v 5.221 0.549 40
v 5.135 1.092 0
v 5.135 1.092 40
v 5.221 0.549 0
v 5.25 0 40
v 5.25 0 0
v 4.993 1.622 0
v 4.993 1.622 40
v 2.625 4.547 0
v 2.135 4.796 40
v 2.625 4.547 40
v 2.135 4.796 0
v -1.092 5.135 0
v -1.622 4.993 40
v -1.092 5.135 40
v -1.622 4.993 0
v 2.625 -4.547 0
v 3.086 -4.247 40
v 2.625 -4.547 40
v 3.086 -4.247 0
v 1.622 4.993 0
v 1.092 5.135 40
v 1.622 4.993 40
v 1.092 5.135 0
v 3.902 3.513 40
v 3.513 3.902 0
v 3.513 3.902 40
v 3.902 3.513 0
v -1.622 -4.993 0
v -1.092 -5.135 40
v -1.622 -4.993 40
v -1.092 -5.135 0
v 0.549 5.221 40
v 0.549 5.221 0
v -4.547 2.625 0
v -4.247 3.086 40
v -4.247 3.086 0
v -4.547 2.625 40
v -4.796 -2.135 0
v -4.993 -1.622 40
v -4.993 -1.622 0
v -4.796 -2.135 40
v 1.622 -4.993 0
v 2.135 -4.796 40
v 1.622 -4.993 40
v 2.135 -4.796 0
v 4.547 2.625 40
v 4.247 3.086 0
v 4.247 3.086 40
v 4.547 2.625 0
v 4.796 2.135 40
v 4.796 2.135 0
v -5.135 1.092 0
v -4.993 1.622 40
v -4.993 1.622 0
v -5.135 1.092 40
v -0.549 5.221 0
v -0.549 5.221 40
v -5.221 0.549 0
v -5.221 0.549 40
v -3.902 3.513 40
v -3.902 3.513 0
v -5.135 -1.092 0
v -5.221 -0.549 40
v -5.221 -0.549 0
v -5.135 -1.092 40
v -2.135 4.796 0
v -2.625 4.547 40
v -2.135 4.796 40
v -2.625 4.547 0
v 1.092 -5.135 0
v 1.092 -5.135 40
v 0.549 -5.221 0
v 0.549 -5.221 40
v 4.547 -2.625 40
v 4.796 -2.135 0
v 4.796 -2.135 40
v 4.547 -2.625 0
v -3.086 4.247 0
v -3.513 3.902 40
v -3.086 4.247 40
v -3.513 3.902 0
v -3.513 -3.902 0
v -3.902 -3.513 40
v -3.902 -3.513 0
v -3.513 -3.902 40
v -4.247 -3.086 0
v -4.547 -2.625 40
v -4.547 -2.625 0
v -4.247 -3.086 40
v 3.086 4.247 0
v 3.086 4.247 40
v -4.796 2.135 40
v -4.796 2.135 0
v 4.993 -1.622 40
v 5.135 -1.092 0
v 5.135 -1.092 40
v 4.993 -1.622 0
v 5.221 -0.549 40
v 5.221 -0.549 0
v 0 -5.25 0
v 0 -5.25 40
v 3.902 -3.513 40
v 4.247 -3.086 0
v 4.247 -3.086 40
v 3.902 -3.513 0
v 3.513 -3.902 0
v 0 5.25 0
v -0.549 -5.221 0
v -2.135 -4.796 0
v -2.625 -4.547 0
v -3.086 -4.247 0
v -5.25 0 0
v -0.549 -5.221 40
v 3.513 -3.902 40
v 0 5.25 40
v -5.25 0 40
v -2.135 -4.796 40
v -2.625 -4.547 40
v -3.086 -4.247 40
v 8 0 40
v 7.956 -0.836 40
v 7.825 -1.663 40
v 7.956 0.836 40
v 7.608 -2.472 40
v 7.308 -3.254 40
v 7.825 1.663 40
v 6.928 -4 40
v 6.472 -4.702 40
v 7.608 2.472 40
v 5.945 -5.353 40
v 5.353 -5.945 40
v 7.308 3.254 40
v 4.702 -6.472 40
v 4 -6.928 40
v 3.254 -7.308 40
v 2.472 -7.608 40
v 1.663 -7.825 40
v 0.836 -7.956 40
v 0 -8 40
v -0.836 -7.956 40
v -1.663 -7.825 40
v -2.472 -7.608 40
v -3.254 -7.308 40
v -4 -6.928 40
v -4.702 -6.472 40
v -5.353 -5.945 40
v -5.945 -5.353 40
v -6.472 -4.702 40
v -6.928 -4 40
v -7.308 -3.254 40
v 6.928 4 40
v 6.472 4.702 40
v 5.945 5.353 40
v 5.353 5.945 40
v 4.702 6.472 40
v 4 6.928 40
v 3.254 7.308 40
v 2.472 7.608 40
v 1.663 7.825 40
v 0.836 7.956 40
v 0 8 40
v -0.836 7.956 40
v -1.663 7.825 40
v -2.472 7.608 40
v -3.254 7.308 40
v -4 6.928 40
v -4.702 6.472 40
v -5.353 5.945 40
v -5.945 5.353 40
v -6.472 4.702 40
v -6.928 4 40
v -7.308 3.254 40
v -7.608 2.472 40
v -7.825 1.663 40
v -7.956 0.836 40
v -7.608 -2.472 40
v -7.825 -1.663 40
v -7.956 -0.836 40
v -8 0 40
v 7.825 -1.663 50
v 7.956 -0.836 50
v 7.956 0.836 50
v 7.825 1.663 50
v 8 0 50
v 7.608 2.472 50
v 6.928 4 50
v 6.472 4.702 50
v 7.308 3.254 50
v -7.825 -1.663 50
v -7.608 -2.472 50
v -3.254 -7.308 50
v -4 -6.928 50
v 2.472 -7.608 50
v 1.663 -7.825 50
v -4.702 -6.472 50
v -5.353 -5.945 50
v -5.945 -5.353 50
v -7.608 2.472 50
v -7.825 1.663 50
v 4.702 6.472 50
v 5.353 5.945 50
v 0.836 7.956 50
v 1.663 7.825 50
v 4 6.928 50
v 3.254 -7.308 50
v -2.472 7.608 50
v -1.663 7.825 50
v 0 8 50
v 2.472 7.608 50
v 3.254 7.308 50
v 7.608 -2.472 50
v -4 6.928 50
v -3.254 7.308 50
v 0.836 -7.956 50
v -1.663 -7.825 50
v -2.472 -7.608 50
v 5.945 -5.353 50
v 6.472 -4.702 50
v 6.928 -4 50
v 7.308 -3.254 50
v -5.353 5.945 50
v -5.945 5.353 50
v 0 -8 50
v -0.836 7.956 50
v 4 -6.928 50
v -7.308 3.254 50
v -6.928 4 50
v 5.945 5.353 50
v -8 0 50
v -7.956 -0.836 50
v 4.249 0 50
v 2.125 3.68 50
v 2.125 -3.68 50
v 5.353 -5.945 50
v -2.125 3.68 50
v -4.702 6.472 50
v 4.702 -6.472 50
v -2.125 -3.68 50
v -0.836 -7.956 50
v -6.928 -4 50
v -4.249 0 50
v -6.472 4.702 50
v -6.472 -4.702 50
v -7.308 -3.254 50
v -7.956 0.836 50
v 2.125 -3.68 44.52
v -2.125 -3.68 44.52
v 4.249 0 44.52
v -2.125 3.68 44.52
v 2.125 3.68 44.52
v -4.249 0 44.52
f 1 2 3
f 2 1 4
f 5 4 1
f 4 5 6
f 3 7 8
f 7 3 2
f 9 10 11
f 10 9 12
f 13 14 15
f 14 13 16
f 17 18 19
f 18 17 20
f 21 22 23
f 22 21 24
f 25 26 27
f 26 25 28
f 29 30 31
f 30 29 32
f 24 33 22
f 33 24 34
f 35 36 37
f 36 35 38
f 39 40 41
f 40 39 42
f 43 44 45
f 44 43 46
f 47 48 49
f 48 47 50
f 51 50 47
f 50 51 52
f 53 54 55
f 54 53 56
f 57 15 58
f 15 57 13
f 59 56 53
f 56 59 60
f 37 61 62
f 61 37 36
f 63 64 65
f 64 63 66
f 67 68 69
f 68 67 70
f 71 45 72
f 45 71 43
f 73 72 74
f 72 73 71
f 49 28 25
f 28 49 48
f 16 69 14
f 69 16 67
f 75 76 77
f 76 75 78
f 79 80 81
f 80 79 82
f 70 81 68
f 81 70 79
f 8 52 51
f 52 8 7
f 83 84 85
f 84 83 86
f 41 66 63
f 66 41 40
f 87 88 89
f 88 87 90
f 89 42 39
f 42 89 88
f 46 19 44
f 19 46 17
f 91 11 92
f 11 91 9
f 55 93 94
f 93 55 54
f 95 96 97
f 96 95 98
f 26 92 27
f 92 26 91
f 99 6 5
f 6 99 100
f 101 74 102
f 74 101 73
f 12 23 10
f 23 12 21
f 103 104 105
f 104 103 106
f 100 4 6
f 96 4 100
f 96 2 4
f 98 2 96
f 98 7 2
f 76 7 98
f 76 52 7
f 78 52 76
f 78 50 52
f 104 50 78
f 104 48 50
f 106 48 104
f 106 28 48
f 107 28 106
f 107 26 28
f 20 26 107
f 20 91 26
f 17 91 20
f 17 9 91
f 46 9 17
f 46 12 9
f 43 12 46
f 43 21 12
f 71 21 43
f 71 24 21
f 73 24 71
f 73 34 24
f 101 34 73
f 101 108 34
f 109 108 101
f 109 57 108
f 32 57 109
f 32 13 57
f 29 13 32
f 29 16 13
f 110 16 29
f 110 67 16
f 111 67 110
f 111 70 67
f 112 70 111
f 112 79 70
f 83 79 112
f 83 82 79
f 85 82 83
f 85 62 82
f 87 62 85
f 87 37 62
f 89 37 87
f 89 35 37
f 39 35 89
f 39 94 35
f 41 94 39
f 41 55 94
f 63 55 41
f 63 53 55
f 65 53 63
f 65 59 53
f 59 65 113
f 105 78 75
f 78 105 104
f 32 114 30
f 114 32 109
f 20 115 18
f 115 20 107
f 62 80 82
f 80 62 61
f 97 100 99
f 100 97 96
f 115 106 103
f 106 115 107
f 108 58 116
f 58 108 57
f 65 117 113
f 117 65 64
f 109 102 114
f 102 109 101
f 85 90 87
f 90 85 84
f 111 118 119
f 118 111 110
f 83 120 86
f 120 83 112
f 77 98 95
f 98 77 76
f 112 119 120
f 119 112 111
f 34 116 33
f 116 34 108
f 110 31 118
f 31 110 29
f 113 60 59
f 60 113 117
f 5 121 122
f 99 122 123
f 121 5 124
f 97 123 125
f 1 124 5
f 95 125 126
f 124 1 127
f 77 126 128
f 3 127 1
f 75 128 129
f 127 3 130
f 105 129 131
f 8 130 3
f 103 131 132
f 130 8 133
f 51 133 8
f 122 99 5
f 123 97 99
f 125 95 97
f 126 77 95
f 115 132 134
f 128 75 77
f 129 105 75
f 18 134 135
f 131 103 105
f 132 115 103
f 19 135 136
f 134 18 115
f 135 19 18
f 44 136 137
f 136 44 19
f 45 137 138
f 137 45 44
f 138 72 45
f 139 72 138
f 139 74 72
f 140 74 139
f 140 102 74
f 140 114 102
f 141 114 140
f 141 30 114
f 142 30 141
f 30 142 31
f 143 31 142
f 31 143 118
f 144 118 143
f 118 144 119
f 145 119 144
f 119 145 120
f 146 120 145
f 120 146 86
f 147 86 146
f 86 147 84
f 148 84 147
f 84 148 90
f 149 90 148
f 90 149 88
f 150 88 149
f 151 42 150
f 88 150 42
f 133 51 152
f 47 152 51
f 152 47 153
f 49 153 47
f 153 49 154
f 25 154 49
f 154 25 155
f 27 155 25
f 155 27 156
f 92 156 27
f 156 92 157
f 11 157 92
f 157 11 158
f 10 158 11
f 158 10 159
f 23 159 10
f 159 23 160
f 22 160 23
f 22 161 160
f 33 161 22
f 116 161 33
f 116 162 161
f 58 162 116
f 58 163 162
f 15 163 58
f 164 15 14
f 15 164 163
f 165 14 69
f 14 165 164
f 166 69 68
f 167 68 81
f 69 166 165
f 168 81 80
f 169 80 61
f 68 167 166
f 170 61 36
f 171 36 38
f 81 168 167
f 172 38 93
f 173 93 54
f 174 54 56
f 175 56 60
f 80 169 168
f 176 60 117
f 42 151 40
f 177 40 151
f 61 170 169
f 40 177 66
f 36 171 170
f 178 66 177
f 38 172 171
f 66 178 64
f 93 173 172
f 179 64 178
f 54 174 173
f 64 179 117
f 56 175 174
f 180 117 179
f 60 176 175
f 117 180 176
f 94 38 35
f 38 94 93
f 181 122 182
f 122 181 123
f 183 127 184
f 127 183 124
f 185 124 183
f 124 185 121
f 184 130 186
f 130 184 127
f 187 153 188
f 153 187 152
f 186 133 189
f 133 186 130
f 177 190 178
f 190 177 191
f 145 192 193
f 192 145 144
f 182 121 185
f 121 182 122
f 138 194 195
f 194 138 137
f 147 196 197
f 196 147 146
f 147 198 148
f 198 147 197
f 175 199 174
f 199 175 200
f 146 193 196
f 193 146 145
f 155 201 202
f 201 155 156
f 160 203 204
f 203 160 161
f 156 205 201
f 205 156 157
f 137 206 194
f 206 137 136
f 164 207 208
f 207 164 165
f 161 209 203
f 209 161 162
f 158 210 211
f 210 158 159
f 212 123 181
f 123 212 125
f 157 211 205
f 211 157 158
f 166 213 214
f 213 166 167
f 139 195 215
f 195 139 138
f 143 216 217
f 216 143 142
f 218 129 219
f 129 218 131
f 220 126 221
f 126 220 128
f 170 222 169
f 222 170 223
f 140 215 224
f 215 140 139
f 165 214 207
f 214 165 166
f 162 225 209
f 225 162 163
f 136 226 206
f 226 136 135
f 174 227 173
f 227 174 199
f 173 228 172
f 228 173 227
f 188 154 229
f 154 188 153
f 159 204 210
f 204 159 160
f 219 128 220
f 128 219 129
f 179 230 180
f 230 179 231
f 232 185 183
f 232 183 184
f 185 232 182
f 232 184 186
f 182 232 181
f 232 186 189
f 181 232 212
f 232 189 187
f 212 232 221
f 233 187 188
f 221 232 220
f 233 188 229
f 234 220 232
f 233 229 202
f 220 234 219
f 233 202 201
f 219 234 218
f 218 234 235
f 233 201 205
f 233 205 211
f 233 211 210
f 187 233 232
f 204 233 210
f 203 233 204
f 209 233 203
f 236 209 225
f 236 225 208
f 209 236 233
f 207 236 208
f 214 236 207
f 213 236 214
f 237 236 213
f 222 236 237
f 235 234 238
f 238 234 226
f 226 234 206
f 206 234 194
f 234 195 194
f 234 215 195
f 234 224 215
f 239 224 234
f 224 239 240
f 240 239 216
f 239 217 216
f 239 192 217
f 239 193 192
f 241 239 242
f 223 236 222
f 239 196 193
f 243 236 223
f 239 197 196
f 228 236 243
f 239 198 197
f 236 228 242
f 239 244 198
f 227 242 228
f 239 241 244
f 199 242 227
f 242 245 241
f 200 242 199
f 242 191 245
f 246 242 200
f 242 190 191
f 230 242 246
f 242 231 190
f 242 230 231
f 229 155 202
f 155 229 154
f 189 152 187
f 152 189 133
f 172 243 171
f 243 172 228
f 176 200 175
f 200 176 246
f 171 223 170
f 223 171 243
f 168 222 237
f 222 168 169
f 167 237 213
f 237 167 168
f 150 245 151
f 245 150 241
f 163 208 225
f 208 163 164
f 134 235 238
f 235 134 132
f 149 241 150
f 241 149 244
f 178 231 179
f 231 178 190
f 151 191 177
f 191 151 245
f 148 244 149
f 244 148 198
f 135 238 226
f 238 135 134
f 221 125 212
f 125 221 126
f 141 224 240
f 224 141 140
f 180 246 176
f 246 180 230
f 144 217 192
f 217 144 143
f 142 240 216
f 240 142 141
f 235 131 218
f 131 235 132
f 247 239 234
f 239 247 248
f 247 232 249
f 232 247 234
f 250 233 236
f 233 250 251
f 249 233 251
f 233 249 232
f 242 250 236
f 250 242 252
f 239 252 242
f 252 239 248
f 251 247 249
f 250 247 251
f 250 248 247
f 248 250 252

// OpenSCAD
// Socket-head cap screw, smooth printable representation.
$fn = 60;
eps = 0.02;
shaft_d = 10.5;
head_d = 16;
head_h = 10;
shaft_l = 40;
socket_flat = head_d * 0.46;
socket_depth = head_h * 0.55;
difference() {
    union() {
        cylinder(d = shaft_d, h = shaft_l);
        translate([0, 0, shaft_l]) cylinder(d = head_d, h = head_h);
    }
    translate([0, 0, shaft_l + head_h - socket_depth + eps])
        cylinder(d = socket_flat / cos(30), h = socket_depth + eps, $fn = 6);
}
